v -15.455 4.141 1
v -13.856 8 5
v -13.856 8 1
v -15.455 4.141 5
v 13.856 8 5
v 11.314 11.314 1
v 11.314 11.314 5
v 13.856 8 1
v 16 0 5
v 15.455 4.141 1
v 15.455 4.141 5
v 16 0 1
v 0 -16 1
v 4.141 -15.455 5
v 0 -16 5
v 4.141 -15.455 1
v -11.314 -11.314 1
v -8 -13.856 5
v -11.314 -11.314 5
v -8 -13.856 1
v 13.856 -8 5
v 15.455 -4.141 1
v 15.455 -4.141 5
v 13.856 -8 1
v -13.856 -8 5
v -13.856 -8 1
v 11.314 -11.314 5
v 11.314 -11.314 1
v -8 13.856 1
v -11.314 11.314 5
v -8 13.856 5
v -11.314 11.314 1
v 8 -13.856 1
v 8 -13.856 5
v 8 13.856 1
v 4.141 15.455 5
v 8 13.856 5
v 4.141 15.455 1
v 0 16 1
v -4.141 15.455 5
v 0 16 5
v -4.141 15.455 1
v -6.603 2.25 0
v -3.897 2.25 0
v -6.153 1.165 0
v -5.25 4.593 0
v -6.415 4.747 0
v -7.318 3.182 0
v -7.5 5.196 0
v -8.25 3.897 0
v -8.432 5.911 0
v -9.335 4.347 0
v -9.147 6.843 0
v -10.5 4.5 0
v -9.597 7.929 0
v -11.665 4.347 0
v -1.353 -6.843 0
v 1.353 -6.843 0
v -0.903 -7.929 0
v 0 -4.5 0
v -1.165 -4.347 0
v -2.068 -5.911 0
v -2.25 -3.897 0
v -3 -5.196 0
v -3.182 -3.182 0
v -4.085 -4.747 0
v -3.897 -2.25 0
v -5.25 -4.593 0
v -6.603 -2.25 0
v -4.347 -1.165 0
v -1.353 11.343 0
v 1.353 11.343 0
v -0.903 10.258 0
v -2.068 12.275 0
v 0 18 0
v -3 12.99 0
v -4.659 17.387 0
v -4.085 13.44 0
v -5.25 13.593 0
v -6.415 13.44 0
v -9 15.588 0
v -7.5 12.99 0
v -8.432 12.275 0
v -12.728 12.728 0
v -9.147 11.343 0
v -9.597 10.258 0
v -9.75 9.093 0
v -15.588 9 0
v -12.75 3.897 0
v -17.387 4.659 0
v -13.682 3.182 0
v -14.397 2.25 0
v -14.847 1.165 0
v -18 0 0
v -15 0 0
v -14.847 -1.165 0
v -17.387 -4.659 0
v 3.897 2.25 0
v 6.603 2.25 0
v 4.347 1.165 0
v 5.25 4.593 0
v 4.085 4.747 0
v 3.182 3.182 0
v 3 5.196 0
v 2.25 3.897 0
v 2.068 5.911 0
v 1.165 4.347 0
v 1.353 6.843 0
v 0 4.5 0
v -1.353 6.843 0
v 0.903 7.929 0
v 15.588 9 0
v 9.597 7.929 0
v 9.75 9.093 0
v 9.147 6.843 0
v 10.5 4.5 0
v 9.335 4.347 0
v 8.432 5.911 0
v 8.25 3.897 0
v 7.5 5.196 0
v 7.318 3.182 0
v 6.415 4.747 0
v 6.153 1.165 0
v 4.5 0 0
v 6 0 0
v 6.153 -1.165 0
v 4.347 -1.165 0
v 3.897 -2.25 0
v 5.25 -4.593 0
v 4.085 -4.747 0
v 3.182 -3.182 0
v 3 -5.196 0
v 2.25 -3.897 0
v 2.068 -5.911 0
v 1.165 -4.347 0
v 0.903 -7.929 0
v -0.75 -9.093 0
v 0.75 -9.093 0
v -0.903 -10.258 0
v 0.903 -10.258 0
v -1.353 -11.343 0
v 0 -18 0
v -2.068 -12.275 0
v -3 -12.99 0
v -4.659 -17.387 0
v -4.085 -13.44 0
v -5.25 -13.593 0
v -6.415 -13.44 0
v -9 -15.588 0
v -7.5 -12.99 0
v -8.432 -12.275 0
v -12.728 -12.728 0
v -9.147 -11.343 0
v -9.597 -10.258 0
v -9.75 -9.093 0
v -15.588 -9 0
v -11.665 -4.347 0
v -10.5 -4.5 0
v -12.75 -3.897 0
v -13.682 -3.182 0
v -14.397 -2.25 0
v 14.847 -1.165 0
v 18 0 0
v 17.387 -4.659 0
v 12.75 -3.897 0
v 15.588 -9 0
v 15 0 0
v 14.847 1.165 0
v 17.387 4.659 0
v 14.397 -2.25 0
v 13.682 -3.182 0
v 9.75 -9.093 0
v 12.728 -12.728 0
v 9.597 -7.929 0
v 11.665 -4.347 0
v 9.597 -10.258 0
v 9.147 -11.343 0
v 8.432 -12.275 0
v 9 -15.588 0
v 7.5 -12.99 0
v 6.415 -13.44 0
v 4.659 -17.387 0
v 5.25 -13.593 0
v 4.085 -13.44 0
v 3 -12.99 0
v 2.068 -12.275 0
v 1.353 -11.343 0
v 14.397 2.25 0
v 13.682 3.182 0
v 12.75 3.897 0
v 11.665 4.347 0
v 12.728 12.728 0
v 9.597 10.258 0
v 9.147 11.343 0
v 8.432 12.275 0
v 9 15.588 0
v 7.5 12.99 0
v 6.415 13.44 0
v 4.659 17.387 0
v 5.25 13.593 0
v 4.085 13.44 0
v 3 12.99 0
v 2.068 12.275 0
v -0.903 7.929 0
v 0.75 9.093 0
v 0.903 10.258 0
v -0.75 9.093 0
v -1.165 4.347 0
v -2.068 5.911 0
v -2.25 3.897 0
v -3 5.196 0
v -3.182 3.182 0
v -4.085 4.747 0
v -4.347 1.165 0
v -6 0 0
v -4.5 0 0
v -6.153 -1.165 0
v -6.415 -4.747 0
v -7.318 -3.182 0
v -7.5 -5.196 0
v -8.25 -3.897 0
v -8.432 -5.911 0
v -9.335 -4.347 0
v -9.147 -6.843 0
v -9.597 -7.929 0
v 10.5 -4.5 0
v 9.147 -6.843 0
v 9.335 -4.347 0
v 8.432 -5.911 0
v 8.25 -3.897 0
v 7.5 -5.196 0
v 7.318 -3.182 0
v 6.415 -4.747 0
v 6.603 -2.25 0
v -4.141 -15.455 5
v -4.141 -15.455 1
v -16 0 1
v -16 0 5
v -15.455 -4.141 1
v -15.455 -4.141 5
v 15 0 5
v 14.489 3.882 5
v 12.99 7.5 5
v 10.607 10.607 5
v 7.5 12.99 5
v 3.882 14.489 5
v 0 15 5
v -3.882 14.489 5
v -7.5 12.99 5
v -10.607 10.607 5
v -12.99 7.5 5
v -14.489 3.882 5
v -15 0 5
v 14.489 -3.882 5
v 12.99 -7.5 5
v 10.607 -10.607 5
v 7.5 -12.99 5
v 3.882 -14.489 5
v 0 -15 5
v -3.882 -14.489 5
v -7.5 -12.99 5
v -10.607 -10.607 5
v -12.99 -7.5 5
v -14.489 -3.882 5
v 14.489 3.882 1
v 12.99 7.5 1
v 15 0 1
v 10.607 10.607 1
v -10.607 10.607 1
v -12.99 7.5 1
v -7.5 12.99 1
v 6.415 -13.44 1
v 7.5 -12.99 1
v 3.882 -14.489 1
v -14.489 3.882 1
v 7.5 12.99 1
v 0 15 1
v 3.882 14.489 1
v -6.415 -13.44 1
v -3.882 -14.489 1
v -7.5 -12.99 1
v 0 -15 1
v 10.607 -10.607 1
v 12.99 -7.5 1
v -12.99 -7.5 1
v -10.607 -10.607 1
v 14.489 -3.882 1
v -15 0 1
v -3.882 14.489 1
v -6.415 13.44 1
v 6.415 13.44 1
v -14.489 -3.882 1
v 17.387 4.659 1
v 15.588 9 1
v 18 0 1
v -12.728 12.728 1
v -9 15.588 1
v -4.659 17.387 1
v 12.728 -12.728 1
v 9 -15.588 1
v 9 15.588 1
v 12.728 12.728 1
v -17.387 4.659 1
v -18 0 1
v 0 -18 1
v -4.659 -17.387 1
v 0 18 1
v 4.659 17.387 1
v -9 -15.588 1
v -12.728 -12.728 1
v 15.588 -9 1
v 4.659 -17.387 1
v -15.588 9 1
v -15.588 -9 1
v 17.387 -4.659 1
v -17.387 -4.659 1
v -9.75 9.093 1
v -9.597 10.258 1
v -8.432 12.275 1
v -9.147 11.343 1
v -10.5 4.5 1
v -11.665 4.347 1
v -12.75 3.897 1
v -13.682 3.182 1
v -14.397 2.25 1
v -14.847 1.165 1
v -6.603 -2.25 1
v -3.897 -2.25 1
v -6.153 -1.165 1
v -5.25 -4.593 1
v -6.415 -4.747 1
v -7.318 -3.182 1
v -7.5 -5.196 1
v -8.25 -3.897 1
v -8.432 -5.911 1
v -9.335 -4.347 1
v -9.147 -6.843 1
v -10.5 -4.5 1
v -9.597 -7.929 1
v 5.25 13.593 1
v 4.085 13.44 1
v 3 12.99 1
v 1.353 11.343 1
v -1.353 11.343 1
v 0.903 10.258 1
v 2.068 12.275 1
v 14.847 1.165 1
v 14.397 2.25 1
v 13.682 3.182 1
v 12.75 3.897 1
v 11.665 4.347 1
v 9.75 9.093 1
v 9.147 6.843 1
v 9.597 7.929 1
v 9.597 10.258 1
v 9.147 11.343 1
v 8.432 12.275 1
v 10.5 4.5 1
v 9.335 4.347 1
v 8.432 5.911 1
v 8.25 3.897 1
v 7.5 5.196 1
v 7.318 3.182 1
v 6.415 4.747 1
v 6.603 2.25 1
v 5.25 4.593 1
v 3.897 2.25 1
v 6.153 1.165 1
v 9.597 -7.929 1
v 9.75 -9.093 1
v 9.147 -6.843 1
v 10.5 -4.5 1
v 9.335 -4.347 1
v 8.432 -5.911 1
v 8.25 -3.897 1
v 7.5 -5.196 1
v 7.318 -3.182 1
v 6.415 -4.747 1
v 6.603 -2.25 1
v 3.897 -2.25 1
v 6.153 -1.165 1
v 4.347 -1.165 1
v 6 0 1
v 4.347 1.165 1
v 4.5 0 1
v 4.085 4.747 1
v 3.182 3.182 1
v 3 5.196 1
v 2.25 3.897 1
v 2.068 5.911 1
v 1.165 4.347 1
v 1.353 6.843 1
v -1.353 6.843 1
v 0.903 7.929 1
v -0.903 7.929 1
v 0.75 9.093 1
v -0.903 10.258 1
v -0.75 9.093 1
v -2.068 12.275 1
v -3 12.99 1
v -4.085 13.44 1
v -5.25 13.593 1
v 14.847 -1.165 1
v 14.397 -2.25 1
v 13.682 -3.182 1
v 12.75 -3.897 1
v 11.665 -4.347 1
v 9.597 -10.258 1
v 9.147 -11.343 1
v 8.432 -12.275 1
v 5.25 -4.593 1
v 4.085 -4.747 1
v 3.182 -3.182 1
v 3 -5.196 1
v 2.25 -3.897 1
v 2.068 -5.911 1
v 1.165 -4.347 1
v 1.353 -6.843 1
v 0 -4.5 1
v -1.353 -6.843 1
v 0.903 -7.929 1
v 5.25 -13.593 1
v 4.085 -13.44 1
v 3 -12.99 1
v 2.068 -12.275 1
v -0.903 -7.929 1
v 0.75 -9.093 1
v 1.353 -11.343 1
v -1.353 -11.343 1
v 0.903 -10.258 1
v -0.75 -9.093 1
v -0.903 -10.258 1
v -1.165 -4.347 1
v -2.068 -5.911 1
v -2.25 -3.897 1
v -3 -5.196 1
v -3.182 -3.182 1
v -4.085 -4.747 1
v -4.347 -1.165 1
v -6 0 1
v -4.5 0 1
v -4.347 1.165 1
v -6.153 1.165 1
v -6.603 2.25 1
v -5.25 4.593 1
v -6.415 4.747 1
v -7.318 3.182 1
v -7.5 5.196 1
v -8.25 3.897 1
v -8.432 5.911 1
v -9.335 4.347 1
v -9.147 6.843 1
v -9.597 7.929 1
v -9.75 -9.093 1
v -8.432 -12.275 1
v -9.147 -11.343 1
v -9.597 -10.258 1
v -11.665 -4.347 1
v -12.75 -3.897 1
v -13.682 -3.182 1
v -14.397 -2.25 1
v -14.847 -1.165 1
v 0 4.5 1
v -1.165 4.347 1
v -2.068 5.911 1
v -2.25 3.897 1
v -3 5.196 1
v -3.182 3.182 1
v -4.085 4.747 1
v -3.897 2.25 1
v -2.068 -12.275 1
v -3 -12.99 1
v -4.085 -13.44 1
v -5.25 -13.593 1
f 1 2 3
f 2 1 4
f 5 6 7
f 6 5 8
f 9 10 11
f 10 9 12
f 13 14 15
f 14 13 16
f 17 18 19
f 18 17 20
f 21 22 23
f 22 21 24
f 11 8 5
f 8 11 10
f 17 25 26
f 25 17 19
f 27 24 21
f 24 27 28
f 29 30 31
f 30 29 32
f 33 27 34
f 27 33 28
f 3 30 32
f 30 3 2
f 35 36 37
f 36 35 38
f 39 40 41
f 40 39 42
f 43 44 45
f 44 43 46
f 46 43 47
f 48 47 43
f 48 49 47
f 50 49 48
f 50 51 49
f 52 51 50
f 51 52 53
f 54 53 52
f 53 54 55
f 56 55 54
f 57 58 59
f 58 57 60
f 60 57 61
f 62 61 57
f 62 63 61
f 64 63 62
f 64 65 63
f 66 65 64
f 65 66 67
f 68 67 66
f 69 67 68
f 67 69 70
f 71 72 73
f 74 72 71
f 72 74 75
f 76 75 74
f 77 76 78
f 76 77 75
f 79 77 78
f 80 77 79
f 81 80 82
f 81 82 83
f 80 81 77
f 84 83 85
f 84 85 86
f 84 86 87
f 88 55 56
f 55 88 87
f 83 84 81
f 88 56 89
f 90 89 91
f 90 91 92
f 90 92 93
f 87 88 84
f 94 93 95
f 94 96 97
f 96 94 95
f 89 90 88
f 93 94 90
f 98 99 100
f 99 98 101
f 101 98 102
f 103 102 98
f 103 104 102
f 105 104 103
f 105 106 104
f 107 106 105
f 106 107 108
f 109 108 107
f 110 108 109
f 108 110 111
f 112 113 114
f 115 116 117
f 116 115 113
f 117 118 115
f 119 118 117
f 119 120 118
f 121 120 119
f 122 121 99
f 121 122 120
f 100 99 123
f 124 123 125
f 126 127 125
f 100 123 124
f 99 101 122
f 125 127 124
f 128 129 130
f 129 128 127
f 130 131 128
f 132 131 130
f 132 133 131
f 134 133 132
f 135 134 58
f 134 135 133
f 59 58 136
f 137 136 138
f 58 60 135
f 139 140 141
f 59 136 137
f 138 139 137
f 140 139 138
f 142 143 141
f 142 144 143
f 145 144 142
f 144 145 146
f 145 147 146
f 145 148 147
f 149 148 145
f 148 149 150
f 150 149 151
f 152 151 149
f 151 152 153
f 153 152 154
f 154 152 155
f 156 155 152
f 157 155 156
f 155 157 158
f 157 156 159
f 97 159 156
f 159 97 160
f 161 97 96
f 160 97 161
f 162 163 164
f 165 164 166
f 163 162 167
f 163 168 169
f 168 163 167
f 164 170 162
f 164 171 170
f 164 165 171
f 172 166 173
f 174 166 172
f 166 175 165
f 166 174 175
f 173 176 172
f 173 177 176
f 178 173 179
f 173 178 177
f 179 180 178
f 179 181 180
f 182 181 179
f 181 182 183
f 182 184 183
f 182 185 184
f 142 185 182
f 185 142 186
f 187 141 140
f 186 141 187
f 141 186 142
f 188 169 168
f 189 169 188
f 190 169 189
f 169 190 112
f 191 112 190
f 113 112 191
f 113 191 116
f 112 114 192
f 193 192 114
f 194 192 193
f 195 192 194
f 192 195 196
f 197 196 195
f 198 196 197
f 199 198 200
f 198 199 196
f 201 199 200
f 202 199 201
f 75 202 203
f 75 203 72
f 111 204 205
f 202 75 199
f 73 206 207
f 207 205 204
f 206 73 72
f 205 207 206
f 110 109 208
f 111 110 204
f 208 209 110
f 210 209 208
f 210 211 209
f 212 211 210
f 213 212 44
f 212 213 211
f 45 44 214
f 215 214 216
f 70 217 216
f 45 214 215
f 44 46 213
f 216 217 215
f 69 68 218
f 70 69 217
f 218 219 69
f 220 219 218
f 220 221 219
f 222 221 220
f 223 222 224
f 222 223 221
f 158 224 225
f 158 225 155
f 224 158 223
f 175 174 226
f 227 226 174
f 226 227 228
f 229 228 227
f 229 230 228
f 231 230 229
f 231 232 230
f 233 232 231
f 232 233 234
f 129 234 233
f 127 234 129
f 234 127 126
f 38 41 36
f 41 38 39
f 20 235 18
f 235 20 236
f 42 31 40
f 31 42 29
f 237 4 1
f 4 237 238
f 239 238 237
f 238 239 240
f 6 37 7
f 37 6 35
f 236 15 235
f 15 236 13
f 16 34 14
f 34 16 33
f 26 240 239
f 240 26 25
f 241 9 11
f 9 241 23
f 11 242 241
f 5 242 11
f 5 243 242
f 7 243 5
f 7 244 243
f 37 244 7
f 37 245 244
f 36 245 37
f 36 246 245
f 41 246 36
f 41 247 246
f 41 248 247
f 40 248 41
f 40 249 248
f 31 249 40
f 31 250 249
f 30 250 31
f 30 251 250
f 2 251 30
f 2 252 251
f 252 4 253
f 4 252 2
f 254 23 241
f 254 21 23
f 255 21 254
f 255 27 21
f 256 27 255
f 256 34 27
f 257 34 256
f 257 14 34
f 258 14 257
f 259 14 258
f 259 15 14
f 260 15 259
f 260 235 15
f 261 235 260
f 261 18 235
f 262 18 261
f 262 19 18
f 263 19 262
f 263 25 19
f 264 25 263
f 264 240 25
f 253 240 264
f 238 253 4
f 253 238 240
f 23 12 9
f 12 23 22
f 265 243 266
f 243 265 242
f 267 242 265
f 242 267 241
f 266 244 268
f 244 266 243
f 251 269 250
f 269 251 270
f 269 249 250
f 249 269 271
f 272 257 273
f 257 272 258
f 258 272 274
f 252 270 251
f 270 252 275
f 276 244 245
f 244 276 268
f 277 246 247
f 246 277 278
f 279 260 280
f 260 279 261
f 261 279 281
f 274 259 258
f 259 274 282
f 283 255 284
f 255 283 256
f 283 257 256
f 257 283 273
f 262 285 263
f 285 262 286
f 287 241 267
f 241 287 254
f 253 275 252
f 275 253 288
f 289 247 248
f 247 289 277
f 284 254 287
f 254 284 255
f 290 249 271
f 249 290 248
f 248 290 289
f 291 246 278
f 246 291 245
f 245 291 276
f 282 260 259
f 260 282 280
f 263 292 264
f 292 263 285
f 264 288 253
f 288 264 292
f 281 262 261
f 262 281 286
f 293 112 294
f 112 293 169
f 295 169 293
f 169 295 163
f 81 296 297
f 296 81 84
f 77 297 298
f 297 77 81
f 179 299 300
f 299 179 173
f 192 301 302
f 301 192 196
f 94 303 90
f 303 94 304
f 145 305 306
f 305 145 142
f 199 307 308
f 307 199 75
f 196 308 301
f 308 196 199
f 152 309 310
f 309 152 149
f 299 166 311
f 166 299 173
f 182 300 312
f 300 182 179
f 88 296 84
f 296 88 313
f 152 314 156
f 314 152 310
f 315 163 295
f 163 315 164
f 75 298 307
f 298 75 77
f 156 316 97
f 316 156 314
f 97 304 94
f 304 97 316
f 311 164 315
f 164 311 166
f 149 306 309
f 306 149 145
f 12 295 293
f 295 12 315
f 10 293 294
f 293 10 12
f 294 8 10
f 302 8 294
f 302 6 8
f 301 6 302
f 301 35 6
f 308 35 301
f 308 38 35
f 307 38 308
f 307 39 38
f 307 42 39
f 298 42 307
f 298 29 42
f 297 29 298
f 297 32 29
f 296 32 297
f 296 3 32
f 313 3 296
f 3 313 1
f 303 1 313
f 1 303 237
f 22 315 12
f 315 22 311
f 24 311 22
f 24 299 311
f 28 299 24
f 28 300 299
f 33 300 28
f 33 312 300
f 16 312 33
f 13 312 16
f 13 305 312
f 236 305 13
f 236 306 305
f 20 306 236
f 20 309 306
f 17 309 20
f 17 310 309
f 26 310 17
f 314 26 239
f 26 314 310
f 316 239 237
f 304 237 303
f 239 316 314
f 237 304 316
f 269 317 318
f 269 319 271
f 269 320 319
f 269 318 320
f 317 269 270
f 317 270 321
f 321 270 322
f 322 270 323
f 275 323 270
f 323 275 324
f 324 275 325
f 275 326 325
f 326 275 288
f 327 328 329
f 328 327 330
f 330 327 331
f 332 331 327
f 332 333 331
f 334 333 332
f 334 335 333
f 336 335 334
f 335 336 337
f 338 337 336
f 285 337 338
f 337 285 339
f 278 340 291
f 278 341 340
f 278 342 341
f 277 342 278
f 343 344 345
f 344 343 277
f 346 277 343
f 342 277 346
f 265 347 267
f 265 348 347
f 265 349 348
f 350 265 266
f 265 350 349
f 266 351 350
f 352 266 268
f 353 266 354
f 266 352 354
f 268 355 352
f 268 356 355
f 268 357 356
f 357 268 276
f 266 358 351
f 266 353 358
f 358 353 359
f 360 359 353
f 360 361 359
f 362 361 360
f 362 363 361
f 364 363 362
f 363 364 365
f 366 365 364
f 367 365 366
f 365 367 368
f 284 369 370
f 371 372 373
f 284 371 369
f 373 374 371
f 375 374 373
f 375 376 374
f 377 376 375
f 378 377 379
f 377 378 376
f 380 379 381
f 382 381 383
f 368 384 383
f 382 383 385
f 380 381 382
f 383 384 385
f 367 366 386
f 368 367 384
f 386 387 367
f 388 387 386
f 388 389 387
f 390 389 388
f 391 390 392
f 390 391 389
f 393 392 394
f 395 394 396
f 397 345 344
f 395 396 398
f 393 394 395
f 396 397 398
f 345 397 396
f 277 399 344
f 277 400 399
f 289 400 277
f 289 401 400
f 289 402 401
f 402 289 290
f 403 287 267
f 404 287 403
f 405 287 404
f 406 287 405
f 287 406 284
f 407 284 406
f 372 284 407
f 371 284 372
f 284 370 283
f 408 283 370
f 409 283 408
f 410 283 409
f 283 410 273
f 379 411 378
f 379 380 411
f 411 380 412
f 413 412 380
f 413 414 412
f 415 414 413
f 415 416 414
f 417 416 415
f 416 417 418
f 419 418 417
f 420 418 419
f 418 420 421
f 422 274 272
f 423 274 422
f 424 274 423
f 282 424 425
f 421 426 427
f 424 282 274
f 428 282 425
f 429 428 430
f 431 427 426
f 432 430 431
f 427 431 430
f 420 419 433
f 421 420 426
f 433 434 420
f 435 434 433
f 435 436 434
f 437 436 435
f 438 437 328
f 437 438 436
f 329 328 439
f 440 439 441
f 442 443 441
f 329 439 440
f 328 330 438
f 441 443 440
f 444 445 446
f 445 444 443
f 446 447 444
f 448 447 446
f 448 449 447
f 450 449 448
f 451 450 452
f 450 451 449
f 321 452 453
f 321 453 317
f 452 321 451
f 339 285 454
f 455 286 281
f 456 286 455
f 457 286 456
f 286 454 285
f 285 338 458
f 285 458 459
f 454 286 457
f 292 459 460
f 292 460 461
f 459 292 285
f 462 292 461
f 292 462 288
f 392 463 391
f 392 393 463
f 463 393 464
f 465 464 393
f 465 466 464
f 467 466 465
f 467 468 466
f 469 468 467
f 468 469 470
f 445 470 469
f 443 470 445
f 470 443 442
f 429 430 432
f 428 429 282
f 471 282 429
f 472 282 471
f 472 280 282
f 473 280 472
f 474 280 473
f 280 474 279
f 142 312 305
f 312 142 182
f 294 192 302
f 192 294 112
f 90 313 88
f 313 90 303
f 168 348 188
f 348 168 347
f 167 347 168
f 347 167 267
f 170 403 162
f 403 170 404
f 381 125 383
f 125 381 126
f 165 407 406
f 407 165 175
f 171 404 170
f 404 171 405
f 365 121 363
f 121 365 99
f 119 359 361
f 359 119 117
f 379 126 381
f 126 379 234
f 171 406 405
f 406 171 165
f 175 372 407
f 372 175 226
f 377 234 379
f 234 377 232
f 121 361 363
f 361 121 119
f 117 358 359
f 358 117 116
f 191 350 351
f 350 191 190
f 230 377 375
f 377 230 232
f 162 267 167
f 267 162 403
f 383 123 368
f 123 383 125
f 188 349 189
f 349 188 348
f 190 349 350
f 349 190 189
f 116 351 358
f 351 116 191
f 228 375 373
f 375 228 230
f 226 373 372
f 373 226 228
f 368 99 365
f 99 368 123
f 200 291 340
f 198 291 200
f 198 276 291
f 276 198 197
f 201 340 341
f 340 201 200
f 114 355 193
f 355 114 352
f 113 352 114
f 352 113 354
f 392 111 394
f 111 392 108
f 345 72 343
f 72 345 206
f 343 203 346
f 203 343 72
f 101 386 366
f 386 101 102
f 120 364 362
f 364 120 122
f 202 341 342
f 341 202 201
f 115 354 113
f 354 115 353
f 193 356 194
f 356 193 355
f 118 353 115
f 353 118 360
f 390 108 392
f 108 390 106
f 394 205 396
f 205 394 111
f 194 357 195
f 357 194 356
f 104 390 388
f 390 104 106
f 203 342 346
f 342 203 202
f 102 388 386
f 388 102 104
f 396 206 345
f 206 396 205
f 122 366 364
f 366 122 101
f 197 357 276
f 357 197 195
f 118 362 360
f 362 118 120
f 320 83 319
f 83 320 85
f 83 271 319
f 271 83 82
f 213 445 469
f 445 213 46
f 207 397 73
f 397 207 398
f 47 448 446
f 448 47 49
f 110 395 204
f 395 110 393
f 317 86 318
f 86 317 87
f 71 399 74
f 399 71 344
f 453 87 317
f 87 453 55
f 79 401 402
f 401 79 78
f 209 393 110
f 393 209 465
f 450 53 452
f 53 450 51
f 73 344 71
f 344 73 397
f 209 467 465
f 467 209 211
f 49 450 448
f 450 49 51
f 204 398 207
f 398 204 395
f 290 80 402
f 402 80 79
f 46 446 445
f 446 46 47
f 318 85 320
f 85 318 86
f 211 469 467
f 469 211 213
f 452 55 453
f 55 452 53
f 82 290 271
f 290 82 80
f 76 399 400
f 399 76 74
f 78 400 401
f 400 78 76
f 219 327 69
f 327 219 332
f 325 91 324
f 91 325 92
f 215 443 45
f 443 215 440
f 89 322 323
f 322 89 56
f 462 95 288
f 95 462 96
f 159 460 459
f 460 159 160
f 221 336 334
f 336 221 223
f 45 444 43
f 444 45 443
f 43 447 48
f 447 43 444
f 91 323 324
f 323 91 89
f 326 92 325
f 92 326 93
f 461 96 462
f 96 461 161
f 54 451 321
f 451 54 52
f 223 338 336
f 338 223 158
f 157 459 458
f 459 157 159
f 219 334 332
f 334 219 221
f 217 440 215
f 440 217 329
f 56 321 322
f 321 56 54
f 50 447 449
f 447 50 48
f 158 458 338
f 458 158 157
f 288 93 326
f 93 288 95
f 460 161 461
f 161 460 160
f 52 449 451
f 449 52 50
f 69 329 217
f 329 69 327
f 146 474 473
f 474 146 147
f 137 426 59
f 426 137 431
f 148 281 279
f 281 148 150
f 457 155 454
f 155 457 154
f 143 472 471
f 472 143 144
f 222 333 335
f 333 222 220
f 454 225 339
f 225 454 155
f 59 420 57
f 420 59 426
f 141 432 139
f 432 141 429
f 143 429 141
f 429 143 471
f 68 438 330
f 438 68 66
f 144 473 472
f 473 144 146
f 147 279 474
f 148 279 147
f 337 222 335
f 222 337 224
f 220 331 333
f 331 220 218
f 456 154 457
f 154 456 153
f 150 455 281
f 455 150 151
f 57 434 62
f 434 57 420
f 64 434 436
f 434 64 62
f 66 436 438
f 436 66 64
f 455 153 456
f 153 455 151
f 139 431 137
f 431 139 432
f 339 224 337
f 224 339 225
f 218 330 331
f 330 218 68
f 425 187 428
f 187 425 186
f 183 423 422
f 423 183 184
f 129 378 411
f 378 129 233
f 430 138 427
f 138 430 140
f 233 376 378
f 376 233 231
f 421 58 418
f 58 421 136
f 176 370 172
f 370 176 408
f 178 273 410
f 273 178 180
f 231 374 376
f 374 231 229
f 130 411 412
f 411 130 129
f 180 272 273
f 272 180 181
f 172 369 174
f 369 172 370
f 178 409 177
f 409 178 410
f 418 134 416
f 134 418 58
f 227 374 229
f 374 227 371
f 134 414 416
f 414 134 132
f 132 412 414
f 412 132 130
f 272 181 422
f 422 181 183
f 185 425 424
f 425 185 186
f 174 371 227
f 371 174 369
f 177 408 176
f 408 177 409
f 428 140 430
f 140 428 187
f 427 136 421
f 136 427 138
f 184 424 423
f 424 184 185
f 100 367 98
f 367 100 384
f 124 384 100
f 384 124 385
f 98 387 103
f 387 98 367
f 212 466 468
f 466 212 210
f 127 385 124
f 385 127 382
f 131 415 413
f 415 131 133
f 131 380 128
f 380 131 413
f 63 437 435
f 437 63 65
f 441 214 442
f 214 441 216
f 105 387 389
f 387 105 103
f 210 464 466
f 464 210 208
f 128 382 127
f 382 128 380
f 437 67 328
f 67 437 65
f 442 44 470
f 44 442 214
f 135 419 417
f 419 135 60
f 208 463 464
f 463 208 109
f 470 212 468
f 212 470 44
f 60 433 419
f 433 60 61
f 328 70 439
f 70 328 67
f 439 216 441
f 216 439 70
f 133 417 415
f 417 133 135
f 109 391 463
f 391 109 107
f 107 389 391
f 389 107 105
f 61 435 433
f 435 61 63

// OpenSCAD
hub_diameter=32;
hub_height=4;
shaft_diameter=9;
wall_thickness=1;
brim_width=2;
hole_diameter=9;
$fn=24;
difference() {
	body();
	shaft();
	holes();
}
module body() { 
	cylinder(d=hub_diameter+brim_width*2,h=wall_thickness);
	difference() {
		cylinder(d=hub_diameter,h=hub_height+wall_thickness);
		cylinder(d=hub_diameter-wall_thickness*2,h=hub_height+wall_thickness);
	}
}
module shaft() {
	cylinder(d=shaft_diameter,h=hub_height);
}
module holes() {
	offset=hub_diameter/2-wall_thickness-hole_diameter/2;
	for(i=[0:360/6:360]) {
		rotate([0,0,i])
			translate([offset,0,0])
			cylinder(d=hole_diameter,h=wall_thickness);
	}
}
